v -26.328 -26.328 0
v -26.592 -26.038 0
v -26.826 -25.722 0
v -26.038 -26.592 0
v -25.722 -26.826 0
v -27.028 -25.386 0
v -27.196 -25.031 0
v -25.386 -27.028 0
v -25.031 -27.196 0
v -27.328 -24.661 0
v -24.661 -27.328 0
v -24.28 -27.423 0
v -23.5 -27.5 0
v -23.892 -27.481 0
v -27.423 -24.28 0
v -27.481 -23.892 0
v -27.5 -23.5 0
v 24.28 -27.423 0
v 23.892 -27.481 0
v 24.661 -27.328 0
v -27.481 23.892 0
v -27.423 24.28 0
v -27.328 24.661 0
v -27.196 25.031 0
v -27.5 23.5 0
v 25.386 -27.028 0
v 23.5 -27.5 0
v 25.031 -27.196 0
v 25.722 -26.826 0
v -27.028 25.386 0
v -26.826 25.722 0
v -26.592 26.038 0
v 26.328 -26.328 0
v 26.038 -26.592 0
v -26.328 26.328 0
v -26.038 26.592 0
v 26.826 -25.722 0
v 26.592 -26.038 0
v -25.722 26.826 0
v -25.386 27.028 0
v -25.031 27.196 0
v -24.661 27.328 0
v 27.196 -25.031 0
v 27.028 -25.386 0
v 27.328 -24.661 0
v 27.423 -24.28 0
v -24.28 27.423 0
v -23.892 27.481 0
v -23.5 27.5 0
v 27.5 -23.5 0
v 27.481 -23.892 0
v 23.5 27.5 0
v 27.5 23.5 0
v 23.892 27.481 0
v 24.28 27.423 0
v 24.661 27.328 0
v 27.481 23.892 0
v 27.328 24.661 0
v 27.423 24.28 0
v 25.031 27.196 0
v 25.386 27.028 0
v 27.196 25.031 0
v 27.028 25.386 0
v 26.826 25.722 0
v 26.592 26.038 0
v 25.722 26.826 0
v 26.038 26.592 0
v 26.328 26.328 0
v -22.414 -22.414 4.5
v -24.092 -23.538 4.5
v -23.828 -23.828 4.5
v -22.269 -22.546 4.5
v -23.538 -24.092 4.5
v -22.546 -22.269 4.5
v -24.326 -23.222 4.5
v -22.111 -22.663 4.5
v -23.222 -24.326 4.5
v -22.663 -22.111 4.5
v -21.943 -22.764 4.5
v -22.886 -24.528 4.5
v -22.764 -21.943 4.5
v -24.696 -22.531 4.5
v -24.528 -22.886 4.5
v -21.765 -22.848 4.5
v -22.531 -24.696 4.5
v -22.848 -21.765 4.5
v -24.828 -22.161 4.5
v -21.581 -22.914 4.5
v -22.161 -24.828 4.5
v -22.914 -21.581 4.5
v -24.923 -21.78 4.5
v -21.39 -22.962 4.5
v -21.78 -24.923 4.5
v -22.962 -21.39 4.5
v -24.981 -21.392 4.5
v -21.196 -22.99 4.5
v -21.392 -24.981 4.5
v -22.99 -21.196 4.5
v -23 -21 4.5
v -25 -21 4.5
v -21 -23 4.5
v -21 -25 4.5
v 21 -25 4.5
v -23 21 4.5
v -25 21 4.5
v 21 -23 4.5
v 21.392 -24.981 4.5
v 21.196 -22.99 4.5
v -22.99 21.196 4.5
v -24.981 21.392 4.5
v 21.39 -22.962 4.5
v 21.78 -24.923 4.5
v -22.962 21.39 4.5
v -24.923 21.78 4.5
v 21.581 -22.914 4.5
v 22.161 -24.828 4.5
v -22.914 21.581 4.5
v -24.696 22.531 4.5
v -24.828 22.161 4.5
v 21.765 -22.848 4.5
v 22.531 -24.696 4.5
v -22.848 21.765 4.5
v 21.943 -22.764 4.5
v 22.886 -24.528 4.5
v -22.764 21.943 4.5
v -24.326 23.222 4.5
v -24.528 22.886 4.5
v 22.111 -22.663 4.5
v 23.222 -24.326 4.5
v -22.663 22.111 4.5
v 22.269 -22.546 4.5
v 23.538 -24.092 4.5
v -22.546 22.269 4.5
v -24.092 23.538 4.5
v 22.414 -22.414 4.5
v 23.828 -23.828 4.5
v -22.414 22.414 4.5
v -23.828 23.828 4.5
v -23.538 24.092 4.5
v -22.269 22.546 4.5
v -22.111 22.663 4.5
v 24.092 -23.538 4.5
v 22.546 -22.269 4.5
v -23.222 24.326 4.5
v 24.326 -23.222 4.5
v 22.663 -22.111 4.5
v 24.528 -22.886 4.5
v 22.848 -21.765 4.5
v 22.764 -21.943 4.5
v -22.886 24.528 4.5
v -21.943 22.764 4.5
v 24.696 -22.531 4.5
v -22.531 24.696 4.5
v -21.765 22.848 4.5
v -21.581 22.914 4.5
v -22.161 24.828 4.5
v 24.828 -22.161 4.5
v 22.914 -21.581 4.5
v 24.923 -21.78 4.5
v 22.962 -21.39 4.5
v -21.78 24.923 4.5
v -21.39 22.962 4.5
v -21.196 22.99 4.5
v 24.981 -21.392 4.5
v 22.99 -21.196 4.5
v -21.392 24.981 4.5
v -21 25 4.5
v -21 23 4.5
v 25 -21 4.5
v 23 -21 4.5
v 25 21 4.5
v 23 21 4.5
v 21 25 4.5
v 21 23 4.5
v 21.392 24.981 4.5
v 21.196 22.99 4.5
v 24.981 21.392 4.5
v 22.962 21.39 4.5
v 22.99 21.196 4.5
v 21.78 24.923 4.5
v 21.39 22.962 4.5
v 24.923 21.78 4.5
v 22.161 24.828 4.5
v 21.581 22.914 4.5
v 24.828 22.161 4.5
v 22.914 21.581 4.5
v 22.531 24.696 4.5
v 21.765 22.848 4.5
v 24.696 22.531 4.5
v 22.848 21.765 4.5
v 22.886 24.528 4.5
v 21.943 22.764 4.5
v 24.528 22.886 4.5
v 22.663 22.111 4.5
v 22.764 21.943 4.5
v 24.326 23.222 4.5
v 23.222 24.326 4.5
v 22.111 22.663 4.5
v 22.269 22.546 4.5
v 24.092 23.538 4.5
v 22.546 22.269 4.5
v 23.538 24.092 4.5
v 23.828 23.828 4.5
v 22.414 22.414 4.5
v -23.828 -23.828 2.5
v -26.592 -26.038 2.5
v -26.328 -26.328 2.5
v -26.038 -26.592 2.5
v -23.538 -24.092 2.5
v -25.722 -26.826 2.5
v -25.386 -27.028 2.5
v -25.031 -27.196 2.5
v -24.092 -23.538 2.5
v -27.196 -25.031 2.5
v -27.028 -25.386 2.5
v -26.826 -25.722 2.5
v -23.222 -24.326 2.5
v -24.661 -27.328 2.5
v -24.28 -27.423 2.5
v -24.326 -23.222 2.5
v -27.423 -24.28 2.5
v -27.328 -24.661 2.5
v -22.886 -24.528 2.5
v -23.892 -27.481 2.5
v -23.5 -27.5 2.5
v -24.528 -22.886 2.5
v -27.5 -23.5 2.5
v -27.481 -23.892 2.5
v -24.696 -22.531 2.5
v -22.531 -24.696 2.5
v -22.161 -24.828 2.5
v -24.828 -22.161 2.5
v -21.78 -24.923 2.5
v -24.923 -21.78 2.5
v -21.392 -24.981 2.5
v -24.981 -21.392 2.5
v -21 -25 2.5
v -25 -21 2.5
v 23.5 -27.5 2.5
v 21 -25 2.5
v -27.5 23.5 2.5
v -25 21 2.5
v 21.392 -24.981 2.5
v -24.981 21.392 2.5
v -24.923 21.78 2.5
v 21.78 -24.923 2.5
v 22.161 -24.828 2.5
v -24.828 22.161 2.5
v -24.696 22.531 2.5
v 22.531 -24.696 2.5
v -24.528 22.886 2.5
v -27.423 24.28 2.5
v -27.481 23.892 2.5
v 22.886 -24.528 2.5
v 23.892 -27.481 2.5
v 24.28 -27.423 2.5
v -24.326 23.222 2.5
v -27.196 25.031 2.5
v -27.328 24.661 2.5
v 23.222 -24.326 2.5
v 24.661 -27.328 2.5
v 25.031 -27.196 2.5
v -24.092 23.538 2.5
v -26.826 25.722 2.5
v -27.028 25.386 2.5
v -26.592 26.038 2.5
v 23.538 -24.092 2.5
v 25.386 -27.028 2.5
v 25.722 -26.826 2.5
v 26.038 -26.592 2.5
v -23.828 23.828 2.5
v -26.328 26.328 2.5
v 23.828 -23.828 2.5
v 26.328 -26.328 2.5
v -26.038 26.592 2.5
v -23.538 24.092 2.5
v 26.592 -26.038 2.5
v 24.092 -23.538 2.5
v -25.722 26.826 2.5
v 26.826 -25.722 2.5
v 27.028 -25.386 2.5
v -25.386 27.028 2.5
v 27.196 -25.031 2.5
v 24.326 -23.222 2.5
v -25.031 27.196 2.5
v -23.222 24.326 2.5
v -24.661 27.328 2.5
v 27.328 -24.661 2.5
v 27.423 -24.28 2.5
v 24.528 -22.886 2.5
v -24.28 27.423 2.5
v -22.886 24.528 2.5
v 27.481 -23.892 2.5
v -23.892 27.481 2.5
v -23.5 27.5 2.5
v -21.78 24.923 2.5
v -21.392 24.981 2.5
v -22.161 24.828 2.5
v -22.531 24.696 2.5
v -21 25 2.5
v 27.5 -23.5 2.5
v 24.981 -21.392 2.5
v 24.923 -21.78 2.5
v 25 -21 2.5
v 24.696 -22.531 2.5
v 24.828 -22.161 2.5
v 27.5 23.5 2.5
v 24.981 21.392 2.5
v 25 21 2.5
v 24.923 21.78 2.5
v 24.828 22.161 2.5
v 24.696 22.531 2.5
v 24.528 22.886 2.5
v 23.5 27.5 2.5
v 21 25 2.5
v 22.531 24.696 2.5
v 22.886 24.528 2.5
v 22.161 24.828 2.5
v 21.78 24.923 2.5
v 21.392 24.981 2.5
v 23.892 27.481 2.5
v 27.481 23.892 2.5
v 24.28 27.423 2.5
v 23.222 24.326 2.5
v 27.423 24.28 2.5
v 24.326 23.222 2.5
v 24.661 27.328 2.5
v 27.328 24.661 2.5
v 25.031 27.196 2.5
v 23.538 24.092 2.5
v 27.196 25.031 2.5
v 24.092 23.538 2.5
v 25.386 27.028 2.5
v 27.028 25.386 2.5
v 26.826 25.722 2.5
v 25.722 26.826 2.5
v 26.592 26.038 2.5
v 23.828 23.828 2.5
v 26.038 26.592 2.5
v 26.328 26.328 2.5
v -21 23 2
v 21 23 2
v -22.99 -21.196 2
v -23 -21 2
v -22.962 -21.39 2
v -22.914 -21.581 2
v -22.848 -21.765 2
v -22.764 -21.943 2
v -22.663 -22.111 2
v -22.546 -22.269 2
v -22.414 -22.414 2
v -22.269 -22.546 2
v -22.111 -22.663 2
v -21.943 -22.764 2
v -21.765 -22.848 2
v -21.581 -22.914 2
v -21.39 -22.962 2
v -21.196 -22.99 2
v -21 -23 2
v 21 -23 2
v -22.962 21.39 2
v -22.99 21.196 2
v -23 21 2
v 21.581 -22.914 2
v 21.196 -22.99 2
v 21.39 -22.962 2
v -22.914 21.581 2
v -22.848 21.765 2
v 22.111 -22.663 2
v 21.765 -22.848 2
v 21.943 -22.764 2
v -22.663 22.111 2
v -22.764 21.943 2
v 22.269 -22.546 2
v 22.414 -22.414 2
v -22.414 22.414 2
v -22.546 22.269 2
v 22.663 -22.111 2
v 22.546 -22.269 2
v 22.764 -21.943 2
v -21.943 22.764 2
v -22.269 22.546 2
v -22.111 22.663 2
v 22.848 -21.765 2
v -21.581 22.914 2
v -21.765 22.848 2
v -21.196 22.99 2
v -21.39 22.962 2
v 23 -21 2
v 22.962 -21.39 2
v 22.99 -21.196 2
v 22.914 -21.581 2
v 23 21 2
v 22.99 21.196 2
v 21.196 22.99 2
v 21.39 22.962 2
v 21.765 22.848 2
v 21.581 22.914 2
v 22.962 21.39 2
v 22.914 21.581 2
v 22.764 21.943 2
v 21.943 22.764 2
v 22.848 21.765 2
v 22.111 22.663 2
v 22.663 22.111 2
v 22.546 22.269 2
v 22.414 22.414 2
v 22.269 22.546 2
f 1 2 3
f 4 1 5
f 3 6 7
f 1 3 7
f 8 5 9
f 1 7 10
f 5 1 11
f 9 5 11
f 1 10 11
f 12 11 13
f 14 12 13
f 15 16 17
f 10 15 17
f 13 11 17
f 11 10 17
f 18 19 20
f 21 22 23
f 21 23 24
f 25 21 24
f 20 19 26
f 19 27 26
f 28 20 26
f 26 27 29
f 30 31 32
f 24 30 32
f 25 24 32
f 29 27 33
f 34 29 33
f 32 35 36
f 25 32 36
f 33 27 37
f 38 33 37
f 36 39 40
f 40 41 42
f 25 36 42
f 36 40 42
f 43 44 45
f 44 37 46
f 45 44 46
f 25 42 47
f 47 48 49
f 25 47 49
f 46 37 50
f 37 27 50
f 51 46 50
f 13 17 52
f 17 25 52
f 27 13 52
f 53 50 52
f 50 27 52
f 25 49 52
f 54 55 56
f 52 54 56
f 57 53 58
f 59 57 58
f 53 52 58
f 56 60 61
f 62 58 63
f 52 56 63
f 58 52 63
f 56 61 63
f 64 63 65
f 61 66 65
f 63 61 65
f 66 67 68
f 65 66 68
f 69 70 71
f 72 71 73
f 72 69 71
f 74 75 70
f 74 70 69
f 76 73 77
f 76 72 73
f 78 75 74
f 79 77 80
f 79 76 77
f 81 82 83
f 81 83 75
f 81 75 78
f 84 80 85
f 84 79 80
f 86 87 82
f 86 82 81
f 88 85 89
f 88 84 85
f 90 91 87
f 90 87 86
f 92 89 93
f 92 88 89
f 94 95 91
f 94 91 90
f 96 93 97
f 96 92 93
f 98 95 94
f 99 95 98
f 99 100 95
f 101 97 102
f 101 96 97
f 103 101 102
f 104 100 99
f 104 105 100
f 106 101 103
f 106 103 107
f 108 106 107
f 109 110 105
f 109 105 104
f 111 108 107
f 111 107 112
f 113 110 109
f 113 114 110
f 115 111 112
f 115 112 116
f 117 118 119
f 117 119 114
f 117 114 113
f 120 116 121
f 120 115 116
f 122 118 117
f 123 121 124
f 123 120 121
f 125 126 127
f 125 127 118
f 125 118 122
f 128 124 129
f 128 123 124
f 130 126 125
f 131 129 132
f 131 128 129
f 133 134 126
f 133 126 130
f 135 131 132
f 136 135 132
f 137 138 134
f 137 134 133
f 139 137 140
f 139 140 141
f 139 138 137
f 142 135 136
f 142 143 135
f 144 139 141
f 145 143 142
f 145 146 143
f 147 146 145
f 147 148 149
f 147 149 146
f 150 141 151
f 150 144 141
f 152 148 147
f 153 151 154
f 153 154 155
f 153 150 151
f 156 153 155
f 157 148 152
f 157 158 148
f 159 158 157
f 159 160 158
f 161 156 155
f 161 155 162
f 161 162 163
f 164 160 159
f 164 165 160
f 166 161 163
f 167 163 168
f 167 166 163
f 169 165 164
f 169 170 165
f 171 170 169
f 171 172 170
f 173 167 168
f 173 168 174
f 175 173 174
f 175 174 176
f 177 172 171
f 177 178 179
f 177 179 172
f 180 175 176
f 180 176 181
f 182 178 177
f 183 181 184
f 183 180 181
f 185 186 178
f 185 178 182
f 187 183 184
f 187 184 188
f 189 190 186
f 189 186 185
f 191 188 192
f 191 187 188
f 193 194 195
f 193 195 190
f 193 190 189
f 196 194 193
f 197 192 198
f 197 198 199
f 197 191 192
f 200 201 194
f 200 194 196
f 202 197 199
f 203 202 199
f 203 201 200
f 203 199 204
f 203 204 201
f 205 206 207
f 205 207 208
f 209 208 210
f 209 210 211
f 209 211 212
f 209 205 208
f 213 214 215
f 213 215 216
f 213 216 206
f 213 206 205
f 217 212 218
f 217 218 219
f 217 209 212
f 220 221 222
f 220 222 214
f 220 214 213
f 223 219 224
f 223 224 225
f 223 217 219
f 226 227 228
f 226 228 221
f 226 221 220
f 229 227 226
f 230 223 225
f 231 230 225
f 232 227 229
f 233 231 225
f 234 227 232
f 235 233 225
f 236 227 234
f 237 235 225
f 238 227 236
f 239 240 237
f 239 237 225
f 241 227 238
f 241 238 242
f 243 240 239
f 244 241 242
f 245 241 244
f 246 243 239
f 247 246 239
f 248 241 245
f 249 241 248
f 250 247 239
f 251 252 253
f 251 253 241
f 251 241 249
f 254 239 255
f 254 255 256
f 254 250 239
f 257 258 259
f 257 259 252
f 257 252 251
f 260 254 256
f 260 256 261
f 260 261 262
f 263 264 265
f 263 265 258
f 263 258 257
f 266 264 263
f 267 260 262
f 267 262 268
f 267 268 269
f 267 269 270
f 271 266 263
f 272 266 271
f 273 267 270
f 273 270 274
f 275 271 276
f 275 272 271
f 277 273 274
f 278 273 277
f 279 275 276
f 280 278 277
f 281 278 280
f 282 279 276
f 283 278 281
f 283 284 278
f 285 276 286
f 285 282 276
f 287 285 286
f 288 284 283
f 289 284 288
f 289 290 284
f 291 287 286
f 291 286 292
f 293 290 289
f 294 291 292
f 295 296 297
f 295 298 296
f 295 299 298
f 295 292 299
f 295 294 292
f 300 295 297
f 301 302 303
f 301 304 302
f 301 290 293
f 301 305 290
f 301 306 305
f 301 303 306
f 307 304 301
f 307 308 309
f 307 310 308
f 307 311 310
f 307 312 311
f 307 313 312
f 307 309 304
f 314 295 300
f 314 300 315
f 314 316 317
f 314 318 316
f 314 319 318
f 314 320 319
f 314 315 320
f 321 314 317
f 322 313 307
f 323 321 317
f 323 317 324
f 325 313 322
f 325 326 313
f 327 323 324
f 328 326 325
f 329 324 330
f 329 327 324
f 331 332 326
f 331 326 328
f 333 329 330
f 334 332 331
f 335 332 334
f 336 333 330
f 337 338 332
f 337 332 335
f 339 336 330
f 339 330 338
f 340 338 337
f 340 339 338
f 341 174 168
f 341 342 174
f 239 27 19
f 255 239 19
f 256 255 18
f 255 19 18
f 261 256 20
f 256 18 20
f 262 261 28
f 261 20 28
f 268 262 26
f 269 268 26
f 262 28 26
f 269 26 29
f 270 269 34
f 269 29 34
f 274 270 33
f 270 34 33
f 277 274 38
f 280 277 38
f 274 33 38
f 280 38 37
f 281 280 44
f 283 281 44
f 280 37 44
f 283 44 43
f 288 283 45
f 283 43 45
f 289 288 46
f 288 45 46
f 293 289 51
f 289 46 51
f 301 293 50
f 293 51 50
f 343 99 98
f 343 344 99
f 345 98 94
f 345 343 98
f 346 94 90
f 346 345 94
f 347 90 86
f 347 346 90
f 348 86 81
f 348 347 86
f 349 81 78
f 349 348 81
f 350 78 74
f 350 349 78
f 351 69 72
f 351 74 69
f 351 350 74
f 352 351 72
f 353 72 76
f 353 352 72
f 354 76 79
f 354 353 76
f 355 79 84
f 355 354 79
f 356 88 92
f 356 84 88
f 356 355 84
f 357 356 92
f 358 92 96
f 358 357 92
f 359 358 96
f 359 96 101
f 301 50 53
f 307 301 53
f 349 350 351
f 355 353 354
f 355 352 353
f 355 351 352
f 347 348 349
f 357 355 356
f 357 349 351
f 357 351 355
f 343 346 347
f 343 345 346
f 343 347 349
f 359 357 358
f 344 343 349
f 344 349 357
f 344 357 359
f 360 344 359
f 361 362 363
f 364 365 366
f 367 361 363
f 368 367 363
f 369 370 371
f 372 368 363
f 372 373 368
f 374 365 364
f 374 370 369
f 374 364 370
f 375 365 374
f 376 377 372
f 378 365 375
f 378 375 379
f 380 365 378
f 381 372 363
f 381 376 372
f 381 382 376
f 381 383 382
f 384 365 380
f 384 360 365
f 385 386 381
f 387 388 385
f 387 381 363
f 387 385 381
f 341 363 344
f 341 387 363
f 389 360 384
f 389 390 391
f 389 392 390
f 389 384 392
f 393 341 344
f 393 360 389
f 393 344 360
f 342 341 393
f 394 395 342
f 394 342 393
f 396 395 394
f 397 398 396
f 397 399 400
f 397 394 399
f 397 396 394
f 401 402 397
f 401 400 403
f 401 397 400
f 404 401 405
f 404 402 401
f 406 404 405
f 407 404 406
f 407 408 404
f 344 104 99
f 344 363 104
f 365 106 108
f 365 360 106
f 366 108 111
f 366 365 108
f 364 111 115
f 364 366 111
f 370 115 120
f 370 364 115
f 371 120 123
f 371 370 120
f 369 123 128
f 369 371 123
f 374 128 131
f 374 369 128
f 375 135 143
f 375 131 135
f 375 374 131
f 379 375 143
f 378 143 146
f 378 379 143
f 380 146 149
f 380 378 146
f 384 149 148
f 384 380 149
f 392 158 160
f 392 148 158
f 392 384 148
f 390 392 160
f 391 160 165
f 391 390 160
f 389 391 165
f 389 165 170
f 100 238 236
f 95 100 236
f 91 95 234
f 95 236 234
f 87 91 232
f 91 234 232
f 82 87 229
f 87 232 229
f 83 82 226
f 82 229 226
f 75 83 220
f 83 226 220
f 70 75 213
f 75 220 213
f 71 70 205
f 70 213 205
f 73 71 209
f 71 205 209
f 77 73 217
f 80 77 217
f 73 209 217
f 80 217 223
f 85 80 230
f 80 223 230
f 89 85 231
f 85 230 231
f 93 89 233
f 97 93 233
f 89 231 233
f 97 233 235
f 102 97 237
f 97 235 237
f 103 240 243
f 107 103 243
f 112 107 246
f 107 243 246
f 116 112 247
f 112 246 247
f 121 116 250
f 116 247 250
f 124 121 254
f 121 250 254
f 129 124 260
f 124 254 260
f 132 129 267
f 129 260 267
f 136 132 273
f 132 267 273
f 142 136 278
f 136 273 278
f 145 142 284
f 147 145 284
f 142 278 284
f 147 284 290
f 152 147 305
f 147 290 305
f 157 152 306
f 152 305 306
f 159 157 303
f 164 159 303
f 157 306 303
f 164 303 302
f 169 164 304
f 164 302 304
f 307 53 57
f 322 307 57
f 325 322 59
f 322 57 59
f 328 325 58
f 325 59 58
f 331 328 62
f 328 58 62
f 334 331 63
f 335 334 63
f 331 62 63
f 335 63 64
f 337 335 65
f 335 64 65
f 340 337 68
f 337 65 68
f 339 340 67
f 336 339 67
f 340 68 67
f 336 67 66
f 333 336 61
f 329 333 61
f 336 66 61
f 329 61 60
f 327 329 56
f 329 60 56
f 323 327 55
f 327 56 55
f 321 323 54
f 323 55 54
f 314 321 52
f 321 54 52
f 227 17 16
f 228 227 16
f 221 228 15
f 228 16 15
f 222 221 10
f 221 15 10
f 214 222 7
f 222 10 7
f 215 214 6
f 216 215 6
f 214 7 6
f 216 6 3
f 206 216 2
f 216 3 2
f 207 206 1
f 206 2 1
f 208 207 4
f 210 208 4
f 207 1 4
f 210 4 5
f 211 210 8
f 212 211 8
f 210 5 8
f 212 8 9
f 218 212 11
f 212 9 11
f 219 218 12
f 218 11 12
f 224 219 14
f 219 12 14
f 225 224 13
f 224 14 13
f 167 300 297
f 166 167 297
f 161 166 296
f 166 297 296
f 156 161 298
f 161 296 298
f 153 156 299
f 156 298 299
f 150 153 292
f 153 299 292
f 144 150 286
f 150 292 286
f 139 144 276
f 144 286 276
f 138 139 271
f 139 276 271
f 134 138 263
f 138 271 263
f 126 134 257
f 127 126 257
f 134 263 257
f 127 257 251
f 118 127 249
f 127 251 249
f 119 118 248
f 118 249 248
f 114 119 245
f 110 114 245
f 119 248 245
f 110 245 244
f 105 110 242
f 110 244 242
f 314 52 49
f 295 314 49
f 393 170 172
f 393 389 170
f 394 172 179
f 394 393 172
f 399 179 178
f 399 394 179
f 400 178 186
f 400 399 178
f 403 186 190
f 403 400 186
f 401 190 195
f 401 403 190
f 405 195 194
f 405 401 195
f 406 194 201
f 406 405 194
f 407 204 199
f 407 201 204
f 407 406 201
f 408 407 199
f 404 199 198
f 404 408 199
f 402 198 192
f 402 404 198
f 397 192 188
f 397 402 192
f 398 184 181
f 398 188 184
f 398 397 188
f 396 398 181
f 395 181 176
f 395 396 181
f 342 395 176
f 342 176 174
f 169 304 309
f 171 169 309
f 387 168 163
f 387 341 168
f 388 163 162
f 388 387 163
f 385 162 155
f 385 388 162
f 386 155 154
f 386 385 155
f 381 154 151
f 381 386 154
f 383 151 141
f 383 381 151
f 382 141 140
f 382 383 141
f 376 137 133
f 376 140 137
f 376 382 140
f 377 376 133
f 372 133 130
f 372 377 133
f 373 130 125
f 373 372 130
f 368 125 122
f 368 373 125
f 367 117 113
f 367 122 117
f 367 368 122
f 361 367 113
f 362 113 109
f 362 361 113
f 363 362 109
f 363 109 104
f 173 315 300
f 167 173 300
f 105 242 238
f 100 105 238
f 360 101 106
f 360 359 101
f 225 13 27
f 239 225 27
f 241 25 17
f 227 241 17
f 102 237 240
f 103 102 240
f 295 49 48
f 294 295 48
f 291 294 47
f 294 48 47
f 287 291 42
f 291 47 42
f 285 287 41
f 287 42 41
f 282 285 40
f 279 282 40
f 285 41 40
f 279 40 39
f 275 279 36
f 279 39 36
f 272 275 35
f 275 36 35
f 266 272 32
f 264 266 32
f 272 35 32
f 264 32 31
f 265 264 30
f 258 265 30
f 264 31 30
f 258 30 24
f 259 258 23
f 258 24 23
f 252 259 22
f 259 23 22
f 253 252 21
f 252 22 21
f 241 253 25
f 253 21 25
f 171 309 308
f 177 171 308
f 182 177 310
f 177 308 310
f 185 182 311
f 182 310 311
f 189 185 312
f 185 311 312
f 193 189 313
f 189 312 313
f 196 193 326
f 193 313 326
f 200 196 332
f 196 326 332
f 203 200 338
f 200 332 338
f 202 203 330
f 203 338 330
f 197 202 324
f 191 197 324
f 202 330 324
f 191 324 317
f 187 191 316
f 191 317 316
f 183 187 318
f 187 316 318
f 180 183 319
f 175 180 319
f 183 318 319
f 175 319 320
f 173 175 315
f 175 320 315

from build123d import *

# Parameters (mm, degrees)
F2_DEPTH = 2.5
F4_DEPTH = 2
F5_T     = -2


with BuildPart() as f2:
    # F1 (on Top) → F2 (new body)
    with BuildSketch(Plane.XY):
        with BuildLine():
            Line((23.5, 27.5), (-23.5, 27.5))
            ThreePointArc((-23.5, 27.5), (-26.3284271247, 26.3284271247), (-27.5, 23.5))
            Line((-27.5, 23.5), (-27.5, -23.5))
            ThreePointArc((-27.5, -23.5), (-26.3284271247, -26.3284271247), (-23.5, -27.5))
            Line((-23.5, -27.5), (23.5, -27.5))
            ThreePointArc((23.5, -27.5), (26.3284271247, -26.3284271247), (27.5, -23.5))
            Line((27.5, -23.5), (27.5, 23.5))
            ThreePointArc((27.5, 23.5), (26.3284271247, 26.3284271247), (23.5, 27.5))
        make_face()
    extrude(amount=F2_DEPTH)

    # F3 (on face) → F4 (join)
    with BuildSketch(Plane.XY.offset(2.5)):
        with BuildLine():
            Line((21, 25), (-21, 25))
            ThreePointArc((-21, 25), (-23.8284271247, 23.8284271247), (-25, 21))
            Line((-25, 21), (-25, -21))
            ThreePointArc((-25, -21), (-23.8284271247, -23.8284271247), (-21, -25))
            Line((-21, -25), (21, -25))
            ThreePointArc((21, -25), (23.8284271247, -23.8284271247), (25, -21))
            Line((25, -21), (25, 21))
            ThreePointArc((25, 21), (23.8284271247, 23.8284271247), (21, 25))
        make_face()
    extrude(amount=F4_DEPTH)

    # F5
    f5_openings = [f2.faces().sort_by_distance(p)[0] for p in [
        (0, 0, 4.5),
    ]]
    offset(amount=F5_T, openings=f5_openings, kind=Kind.INTERSECTION)


solid = f2.part
